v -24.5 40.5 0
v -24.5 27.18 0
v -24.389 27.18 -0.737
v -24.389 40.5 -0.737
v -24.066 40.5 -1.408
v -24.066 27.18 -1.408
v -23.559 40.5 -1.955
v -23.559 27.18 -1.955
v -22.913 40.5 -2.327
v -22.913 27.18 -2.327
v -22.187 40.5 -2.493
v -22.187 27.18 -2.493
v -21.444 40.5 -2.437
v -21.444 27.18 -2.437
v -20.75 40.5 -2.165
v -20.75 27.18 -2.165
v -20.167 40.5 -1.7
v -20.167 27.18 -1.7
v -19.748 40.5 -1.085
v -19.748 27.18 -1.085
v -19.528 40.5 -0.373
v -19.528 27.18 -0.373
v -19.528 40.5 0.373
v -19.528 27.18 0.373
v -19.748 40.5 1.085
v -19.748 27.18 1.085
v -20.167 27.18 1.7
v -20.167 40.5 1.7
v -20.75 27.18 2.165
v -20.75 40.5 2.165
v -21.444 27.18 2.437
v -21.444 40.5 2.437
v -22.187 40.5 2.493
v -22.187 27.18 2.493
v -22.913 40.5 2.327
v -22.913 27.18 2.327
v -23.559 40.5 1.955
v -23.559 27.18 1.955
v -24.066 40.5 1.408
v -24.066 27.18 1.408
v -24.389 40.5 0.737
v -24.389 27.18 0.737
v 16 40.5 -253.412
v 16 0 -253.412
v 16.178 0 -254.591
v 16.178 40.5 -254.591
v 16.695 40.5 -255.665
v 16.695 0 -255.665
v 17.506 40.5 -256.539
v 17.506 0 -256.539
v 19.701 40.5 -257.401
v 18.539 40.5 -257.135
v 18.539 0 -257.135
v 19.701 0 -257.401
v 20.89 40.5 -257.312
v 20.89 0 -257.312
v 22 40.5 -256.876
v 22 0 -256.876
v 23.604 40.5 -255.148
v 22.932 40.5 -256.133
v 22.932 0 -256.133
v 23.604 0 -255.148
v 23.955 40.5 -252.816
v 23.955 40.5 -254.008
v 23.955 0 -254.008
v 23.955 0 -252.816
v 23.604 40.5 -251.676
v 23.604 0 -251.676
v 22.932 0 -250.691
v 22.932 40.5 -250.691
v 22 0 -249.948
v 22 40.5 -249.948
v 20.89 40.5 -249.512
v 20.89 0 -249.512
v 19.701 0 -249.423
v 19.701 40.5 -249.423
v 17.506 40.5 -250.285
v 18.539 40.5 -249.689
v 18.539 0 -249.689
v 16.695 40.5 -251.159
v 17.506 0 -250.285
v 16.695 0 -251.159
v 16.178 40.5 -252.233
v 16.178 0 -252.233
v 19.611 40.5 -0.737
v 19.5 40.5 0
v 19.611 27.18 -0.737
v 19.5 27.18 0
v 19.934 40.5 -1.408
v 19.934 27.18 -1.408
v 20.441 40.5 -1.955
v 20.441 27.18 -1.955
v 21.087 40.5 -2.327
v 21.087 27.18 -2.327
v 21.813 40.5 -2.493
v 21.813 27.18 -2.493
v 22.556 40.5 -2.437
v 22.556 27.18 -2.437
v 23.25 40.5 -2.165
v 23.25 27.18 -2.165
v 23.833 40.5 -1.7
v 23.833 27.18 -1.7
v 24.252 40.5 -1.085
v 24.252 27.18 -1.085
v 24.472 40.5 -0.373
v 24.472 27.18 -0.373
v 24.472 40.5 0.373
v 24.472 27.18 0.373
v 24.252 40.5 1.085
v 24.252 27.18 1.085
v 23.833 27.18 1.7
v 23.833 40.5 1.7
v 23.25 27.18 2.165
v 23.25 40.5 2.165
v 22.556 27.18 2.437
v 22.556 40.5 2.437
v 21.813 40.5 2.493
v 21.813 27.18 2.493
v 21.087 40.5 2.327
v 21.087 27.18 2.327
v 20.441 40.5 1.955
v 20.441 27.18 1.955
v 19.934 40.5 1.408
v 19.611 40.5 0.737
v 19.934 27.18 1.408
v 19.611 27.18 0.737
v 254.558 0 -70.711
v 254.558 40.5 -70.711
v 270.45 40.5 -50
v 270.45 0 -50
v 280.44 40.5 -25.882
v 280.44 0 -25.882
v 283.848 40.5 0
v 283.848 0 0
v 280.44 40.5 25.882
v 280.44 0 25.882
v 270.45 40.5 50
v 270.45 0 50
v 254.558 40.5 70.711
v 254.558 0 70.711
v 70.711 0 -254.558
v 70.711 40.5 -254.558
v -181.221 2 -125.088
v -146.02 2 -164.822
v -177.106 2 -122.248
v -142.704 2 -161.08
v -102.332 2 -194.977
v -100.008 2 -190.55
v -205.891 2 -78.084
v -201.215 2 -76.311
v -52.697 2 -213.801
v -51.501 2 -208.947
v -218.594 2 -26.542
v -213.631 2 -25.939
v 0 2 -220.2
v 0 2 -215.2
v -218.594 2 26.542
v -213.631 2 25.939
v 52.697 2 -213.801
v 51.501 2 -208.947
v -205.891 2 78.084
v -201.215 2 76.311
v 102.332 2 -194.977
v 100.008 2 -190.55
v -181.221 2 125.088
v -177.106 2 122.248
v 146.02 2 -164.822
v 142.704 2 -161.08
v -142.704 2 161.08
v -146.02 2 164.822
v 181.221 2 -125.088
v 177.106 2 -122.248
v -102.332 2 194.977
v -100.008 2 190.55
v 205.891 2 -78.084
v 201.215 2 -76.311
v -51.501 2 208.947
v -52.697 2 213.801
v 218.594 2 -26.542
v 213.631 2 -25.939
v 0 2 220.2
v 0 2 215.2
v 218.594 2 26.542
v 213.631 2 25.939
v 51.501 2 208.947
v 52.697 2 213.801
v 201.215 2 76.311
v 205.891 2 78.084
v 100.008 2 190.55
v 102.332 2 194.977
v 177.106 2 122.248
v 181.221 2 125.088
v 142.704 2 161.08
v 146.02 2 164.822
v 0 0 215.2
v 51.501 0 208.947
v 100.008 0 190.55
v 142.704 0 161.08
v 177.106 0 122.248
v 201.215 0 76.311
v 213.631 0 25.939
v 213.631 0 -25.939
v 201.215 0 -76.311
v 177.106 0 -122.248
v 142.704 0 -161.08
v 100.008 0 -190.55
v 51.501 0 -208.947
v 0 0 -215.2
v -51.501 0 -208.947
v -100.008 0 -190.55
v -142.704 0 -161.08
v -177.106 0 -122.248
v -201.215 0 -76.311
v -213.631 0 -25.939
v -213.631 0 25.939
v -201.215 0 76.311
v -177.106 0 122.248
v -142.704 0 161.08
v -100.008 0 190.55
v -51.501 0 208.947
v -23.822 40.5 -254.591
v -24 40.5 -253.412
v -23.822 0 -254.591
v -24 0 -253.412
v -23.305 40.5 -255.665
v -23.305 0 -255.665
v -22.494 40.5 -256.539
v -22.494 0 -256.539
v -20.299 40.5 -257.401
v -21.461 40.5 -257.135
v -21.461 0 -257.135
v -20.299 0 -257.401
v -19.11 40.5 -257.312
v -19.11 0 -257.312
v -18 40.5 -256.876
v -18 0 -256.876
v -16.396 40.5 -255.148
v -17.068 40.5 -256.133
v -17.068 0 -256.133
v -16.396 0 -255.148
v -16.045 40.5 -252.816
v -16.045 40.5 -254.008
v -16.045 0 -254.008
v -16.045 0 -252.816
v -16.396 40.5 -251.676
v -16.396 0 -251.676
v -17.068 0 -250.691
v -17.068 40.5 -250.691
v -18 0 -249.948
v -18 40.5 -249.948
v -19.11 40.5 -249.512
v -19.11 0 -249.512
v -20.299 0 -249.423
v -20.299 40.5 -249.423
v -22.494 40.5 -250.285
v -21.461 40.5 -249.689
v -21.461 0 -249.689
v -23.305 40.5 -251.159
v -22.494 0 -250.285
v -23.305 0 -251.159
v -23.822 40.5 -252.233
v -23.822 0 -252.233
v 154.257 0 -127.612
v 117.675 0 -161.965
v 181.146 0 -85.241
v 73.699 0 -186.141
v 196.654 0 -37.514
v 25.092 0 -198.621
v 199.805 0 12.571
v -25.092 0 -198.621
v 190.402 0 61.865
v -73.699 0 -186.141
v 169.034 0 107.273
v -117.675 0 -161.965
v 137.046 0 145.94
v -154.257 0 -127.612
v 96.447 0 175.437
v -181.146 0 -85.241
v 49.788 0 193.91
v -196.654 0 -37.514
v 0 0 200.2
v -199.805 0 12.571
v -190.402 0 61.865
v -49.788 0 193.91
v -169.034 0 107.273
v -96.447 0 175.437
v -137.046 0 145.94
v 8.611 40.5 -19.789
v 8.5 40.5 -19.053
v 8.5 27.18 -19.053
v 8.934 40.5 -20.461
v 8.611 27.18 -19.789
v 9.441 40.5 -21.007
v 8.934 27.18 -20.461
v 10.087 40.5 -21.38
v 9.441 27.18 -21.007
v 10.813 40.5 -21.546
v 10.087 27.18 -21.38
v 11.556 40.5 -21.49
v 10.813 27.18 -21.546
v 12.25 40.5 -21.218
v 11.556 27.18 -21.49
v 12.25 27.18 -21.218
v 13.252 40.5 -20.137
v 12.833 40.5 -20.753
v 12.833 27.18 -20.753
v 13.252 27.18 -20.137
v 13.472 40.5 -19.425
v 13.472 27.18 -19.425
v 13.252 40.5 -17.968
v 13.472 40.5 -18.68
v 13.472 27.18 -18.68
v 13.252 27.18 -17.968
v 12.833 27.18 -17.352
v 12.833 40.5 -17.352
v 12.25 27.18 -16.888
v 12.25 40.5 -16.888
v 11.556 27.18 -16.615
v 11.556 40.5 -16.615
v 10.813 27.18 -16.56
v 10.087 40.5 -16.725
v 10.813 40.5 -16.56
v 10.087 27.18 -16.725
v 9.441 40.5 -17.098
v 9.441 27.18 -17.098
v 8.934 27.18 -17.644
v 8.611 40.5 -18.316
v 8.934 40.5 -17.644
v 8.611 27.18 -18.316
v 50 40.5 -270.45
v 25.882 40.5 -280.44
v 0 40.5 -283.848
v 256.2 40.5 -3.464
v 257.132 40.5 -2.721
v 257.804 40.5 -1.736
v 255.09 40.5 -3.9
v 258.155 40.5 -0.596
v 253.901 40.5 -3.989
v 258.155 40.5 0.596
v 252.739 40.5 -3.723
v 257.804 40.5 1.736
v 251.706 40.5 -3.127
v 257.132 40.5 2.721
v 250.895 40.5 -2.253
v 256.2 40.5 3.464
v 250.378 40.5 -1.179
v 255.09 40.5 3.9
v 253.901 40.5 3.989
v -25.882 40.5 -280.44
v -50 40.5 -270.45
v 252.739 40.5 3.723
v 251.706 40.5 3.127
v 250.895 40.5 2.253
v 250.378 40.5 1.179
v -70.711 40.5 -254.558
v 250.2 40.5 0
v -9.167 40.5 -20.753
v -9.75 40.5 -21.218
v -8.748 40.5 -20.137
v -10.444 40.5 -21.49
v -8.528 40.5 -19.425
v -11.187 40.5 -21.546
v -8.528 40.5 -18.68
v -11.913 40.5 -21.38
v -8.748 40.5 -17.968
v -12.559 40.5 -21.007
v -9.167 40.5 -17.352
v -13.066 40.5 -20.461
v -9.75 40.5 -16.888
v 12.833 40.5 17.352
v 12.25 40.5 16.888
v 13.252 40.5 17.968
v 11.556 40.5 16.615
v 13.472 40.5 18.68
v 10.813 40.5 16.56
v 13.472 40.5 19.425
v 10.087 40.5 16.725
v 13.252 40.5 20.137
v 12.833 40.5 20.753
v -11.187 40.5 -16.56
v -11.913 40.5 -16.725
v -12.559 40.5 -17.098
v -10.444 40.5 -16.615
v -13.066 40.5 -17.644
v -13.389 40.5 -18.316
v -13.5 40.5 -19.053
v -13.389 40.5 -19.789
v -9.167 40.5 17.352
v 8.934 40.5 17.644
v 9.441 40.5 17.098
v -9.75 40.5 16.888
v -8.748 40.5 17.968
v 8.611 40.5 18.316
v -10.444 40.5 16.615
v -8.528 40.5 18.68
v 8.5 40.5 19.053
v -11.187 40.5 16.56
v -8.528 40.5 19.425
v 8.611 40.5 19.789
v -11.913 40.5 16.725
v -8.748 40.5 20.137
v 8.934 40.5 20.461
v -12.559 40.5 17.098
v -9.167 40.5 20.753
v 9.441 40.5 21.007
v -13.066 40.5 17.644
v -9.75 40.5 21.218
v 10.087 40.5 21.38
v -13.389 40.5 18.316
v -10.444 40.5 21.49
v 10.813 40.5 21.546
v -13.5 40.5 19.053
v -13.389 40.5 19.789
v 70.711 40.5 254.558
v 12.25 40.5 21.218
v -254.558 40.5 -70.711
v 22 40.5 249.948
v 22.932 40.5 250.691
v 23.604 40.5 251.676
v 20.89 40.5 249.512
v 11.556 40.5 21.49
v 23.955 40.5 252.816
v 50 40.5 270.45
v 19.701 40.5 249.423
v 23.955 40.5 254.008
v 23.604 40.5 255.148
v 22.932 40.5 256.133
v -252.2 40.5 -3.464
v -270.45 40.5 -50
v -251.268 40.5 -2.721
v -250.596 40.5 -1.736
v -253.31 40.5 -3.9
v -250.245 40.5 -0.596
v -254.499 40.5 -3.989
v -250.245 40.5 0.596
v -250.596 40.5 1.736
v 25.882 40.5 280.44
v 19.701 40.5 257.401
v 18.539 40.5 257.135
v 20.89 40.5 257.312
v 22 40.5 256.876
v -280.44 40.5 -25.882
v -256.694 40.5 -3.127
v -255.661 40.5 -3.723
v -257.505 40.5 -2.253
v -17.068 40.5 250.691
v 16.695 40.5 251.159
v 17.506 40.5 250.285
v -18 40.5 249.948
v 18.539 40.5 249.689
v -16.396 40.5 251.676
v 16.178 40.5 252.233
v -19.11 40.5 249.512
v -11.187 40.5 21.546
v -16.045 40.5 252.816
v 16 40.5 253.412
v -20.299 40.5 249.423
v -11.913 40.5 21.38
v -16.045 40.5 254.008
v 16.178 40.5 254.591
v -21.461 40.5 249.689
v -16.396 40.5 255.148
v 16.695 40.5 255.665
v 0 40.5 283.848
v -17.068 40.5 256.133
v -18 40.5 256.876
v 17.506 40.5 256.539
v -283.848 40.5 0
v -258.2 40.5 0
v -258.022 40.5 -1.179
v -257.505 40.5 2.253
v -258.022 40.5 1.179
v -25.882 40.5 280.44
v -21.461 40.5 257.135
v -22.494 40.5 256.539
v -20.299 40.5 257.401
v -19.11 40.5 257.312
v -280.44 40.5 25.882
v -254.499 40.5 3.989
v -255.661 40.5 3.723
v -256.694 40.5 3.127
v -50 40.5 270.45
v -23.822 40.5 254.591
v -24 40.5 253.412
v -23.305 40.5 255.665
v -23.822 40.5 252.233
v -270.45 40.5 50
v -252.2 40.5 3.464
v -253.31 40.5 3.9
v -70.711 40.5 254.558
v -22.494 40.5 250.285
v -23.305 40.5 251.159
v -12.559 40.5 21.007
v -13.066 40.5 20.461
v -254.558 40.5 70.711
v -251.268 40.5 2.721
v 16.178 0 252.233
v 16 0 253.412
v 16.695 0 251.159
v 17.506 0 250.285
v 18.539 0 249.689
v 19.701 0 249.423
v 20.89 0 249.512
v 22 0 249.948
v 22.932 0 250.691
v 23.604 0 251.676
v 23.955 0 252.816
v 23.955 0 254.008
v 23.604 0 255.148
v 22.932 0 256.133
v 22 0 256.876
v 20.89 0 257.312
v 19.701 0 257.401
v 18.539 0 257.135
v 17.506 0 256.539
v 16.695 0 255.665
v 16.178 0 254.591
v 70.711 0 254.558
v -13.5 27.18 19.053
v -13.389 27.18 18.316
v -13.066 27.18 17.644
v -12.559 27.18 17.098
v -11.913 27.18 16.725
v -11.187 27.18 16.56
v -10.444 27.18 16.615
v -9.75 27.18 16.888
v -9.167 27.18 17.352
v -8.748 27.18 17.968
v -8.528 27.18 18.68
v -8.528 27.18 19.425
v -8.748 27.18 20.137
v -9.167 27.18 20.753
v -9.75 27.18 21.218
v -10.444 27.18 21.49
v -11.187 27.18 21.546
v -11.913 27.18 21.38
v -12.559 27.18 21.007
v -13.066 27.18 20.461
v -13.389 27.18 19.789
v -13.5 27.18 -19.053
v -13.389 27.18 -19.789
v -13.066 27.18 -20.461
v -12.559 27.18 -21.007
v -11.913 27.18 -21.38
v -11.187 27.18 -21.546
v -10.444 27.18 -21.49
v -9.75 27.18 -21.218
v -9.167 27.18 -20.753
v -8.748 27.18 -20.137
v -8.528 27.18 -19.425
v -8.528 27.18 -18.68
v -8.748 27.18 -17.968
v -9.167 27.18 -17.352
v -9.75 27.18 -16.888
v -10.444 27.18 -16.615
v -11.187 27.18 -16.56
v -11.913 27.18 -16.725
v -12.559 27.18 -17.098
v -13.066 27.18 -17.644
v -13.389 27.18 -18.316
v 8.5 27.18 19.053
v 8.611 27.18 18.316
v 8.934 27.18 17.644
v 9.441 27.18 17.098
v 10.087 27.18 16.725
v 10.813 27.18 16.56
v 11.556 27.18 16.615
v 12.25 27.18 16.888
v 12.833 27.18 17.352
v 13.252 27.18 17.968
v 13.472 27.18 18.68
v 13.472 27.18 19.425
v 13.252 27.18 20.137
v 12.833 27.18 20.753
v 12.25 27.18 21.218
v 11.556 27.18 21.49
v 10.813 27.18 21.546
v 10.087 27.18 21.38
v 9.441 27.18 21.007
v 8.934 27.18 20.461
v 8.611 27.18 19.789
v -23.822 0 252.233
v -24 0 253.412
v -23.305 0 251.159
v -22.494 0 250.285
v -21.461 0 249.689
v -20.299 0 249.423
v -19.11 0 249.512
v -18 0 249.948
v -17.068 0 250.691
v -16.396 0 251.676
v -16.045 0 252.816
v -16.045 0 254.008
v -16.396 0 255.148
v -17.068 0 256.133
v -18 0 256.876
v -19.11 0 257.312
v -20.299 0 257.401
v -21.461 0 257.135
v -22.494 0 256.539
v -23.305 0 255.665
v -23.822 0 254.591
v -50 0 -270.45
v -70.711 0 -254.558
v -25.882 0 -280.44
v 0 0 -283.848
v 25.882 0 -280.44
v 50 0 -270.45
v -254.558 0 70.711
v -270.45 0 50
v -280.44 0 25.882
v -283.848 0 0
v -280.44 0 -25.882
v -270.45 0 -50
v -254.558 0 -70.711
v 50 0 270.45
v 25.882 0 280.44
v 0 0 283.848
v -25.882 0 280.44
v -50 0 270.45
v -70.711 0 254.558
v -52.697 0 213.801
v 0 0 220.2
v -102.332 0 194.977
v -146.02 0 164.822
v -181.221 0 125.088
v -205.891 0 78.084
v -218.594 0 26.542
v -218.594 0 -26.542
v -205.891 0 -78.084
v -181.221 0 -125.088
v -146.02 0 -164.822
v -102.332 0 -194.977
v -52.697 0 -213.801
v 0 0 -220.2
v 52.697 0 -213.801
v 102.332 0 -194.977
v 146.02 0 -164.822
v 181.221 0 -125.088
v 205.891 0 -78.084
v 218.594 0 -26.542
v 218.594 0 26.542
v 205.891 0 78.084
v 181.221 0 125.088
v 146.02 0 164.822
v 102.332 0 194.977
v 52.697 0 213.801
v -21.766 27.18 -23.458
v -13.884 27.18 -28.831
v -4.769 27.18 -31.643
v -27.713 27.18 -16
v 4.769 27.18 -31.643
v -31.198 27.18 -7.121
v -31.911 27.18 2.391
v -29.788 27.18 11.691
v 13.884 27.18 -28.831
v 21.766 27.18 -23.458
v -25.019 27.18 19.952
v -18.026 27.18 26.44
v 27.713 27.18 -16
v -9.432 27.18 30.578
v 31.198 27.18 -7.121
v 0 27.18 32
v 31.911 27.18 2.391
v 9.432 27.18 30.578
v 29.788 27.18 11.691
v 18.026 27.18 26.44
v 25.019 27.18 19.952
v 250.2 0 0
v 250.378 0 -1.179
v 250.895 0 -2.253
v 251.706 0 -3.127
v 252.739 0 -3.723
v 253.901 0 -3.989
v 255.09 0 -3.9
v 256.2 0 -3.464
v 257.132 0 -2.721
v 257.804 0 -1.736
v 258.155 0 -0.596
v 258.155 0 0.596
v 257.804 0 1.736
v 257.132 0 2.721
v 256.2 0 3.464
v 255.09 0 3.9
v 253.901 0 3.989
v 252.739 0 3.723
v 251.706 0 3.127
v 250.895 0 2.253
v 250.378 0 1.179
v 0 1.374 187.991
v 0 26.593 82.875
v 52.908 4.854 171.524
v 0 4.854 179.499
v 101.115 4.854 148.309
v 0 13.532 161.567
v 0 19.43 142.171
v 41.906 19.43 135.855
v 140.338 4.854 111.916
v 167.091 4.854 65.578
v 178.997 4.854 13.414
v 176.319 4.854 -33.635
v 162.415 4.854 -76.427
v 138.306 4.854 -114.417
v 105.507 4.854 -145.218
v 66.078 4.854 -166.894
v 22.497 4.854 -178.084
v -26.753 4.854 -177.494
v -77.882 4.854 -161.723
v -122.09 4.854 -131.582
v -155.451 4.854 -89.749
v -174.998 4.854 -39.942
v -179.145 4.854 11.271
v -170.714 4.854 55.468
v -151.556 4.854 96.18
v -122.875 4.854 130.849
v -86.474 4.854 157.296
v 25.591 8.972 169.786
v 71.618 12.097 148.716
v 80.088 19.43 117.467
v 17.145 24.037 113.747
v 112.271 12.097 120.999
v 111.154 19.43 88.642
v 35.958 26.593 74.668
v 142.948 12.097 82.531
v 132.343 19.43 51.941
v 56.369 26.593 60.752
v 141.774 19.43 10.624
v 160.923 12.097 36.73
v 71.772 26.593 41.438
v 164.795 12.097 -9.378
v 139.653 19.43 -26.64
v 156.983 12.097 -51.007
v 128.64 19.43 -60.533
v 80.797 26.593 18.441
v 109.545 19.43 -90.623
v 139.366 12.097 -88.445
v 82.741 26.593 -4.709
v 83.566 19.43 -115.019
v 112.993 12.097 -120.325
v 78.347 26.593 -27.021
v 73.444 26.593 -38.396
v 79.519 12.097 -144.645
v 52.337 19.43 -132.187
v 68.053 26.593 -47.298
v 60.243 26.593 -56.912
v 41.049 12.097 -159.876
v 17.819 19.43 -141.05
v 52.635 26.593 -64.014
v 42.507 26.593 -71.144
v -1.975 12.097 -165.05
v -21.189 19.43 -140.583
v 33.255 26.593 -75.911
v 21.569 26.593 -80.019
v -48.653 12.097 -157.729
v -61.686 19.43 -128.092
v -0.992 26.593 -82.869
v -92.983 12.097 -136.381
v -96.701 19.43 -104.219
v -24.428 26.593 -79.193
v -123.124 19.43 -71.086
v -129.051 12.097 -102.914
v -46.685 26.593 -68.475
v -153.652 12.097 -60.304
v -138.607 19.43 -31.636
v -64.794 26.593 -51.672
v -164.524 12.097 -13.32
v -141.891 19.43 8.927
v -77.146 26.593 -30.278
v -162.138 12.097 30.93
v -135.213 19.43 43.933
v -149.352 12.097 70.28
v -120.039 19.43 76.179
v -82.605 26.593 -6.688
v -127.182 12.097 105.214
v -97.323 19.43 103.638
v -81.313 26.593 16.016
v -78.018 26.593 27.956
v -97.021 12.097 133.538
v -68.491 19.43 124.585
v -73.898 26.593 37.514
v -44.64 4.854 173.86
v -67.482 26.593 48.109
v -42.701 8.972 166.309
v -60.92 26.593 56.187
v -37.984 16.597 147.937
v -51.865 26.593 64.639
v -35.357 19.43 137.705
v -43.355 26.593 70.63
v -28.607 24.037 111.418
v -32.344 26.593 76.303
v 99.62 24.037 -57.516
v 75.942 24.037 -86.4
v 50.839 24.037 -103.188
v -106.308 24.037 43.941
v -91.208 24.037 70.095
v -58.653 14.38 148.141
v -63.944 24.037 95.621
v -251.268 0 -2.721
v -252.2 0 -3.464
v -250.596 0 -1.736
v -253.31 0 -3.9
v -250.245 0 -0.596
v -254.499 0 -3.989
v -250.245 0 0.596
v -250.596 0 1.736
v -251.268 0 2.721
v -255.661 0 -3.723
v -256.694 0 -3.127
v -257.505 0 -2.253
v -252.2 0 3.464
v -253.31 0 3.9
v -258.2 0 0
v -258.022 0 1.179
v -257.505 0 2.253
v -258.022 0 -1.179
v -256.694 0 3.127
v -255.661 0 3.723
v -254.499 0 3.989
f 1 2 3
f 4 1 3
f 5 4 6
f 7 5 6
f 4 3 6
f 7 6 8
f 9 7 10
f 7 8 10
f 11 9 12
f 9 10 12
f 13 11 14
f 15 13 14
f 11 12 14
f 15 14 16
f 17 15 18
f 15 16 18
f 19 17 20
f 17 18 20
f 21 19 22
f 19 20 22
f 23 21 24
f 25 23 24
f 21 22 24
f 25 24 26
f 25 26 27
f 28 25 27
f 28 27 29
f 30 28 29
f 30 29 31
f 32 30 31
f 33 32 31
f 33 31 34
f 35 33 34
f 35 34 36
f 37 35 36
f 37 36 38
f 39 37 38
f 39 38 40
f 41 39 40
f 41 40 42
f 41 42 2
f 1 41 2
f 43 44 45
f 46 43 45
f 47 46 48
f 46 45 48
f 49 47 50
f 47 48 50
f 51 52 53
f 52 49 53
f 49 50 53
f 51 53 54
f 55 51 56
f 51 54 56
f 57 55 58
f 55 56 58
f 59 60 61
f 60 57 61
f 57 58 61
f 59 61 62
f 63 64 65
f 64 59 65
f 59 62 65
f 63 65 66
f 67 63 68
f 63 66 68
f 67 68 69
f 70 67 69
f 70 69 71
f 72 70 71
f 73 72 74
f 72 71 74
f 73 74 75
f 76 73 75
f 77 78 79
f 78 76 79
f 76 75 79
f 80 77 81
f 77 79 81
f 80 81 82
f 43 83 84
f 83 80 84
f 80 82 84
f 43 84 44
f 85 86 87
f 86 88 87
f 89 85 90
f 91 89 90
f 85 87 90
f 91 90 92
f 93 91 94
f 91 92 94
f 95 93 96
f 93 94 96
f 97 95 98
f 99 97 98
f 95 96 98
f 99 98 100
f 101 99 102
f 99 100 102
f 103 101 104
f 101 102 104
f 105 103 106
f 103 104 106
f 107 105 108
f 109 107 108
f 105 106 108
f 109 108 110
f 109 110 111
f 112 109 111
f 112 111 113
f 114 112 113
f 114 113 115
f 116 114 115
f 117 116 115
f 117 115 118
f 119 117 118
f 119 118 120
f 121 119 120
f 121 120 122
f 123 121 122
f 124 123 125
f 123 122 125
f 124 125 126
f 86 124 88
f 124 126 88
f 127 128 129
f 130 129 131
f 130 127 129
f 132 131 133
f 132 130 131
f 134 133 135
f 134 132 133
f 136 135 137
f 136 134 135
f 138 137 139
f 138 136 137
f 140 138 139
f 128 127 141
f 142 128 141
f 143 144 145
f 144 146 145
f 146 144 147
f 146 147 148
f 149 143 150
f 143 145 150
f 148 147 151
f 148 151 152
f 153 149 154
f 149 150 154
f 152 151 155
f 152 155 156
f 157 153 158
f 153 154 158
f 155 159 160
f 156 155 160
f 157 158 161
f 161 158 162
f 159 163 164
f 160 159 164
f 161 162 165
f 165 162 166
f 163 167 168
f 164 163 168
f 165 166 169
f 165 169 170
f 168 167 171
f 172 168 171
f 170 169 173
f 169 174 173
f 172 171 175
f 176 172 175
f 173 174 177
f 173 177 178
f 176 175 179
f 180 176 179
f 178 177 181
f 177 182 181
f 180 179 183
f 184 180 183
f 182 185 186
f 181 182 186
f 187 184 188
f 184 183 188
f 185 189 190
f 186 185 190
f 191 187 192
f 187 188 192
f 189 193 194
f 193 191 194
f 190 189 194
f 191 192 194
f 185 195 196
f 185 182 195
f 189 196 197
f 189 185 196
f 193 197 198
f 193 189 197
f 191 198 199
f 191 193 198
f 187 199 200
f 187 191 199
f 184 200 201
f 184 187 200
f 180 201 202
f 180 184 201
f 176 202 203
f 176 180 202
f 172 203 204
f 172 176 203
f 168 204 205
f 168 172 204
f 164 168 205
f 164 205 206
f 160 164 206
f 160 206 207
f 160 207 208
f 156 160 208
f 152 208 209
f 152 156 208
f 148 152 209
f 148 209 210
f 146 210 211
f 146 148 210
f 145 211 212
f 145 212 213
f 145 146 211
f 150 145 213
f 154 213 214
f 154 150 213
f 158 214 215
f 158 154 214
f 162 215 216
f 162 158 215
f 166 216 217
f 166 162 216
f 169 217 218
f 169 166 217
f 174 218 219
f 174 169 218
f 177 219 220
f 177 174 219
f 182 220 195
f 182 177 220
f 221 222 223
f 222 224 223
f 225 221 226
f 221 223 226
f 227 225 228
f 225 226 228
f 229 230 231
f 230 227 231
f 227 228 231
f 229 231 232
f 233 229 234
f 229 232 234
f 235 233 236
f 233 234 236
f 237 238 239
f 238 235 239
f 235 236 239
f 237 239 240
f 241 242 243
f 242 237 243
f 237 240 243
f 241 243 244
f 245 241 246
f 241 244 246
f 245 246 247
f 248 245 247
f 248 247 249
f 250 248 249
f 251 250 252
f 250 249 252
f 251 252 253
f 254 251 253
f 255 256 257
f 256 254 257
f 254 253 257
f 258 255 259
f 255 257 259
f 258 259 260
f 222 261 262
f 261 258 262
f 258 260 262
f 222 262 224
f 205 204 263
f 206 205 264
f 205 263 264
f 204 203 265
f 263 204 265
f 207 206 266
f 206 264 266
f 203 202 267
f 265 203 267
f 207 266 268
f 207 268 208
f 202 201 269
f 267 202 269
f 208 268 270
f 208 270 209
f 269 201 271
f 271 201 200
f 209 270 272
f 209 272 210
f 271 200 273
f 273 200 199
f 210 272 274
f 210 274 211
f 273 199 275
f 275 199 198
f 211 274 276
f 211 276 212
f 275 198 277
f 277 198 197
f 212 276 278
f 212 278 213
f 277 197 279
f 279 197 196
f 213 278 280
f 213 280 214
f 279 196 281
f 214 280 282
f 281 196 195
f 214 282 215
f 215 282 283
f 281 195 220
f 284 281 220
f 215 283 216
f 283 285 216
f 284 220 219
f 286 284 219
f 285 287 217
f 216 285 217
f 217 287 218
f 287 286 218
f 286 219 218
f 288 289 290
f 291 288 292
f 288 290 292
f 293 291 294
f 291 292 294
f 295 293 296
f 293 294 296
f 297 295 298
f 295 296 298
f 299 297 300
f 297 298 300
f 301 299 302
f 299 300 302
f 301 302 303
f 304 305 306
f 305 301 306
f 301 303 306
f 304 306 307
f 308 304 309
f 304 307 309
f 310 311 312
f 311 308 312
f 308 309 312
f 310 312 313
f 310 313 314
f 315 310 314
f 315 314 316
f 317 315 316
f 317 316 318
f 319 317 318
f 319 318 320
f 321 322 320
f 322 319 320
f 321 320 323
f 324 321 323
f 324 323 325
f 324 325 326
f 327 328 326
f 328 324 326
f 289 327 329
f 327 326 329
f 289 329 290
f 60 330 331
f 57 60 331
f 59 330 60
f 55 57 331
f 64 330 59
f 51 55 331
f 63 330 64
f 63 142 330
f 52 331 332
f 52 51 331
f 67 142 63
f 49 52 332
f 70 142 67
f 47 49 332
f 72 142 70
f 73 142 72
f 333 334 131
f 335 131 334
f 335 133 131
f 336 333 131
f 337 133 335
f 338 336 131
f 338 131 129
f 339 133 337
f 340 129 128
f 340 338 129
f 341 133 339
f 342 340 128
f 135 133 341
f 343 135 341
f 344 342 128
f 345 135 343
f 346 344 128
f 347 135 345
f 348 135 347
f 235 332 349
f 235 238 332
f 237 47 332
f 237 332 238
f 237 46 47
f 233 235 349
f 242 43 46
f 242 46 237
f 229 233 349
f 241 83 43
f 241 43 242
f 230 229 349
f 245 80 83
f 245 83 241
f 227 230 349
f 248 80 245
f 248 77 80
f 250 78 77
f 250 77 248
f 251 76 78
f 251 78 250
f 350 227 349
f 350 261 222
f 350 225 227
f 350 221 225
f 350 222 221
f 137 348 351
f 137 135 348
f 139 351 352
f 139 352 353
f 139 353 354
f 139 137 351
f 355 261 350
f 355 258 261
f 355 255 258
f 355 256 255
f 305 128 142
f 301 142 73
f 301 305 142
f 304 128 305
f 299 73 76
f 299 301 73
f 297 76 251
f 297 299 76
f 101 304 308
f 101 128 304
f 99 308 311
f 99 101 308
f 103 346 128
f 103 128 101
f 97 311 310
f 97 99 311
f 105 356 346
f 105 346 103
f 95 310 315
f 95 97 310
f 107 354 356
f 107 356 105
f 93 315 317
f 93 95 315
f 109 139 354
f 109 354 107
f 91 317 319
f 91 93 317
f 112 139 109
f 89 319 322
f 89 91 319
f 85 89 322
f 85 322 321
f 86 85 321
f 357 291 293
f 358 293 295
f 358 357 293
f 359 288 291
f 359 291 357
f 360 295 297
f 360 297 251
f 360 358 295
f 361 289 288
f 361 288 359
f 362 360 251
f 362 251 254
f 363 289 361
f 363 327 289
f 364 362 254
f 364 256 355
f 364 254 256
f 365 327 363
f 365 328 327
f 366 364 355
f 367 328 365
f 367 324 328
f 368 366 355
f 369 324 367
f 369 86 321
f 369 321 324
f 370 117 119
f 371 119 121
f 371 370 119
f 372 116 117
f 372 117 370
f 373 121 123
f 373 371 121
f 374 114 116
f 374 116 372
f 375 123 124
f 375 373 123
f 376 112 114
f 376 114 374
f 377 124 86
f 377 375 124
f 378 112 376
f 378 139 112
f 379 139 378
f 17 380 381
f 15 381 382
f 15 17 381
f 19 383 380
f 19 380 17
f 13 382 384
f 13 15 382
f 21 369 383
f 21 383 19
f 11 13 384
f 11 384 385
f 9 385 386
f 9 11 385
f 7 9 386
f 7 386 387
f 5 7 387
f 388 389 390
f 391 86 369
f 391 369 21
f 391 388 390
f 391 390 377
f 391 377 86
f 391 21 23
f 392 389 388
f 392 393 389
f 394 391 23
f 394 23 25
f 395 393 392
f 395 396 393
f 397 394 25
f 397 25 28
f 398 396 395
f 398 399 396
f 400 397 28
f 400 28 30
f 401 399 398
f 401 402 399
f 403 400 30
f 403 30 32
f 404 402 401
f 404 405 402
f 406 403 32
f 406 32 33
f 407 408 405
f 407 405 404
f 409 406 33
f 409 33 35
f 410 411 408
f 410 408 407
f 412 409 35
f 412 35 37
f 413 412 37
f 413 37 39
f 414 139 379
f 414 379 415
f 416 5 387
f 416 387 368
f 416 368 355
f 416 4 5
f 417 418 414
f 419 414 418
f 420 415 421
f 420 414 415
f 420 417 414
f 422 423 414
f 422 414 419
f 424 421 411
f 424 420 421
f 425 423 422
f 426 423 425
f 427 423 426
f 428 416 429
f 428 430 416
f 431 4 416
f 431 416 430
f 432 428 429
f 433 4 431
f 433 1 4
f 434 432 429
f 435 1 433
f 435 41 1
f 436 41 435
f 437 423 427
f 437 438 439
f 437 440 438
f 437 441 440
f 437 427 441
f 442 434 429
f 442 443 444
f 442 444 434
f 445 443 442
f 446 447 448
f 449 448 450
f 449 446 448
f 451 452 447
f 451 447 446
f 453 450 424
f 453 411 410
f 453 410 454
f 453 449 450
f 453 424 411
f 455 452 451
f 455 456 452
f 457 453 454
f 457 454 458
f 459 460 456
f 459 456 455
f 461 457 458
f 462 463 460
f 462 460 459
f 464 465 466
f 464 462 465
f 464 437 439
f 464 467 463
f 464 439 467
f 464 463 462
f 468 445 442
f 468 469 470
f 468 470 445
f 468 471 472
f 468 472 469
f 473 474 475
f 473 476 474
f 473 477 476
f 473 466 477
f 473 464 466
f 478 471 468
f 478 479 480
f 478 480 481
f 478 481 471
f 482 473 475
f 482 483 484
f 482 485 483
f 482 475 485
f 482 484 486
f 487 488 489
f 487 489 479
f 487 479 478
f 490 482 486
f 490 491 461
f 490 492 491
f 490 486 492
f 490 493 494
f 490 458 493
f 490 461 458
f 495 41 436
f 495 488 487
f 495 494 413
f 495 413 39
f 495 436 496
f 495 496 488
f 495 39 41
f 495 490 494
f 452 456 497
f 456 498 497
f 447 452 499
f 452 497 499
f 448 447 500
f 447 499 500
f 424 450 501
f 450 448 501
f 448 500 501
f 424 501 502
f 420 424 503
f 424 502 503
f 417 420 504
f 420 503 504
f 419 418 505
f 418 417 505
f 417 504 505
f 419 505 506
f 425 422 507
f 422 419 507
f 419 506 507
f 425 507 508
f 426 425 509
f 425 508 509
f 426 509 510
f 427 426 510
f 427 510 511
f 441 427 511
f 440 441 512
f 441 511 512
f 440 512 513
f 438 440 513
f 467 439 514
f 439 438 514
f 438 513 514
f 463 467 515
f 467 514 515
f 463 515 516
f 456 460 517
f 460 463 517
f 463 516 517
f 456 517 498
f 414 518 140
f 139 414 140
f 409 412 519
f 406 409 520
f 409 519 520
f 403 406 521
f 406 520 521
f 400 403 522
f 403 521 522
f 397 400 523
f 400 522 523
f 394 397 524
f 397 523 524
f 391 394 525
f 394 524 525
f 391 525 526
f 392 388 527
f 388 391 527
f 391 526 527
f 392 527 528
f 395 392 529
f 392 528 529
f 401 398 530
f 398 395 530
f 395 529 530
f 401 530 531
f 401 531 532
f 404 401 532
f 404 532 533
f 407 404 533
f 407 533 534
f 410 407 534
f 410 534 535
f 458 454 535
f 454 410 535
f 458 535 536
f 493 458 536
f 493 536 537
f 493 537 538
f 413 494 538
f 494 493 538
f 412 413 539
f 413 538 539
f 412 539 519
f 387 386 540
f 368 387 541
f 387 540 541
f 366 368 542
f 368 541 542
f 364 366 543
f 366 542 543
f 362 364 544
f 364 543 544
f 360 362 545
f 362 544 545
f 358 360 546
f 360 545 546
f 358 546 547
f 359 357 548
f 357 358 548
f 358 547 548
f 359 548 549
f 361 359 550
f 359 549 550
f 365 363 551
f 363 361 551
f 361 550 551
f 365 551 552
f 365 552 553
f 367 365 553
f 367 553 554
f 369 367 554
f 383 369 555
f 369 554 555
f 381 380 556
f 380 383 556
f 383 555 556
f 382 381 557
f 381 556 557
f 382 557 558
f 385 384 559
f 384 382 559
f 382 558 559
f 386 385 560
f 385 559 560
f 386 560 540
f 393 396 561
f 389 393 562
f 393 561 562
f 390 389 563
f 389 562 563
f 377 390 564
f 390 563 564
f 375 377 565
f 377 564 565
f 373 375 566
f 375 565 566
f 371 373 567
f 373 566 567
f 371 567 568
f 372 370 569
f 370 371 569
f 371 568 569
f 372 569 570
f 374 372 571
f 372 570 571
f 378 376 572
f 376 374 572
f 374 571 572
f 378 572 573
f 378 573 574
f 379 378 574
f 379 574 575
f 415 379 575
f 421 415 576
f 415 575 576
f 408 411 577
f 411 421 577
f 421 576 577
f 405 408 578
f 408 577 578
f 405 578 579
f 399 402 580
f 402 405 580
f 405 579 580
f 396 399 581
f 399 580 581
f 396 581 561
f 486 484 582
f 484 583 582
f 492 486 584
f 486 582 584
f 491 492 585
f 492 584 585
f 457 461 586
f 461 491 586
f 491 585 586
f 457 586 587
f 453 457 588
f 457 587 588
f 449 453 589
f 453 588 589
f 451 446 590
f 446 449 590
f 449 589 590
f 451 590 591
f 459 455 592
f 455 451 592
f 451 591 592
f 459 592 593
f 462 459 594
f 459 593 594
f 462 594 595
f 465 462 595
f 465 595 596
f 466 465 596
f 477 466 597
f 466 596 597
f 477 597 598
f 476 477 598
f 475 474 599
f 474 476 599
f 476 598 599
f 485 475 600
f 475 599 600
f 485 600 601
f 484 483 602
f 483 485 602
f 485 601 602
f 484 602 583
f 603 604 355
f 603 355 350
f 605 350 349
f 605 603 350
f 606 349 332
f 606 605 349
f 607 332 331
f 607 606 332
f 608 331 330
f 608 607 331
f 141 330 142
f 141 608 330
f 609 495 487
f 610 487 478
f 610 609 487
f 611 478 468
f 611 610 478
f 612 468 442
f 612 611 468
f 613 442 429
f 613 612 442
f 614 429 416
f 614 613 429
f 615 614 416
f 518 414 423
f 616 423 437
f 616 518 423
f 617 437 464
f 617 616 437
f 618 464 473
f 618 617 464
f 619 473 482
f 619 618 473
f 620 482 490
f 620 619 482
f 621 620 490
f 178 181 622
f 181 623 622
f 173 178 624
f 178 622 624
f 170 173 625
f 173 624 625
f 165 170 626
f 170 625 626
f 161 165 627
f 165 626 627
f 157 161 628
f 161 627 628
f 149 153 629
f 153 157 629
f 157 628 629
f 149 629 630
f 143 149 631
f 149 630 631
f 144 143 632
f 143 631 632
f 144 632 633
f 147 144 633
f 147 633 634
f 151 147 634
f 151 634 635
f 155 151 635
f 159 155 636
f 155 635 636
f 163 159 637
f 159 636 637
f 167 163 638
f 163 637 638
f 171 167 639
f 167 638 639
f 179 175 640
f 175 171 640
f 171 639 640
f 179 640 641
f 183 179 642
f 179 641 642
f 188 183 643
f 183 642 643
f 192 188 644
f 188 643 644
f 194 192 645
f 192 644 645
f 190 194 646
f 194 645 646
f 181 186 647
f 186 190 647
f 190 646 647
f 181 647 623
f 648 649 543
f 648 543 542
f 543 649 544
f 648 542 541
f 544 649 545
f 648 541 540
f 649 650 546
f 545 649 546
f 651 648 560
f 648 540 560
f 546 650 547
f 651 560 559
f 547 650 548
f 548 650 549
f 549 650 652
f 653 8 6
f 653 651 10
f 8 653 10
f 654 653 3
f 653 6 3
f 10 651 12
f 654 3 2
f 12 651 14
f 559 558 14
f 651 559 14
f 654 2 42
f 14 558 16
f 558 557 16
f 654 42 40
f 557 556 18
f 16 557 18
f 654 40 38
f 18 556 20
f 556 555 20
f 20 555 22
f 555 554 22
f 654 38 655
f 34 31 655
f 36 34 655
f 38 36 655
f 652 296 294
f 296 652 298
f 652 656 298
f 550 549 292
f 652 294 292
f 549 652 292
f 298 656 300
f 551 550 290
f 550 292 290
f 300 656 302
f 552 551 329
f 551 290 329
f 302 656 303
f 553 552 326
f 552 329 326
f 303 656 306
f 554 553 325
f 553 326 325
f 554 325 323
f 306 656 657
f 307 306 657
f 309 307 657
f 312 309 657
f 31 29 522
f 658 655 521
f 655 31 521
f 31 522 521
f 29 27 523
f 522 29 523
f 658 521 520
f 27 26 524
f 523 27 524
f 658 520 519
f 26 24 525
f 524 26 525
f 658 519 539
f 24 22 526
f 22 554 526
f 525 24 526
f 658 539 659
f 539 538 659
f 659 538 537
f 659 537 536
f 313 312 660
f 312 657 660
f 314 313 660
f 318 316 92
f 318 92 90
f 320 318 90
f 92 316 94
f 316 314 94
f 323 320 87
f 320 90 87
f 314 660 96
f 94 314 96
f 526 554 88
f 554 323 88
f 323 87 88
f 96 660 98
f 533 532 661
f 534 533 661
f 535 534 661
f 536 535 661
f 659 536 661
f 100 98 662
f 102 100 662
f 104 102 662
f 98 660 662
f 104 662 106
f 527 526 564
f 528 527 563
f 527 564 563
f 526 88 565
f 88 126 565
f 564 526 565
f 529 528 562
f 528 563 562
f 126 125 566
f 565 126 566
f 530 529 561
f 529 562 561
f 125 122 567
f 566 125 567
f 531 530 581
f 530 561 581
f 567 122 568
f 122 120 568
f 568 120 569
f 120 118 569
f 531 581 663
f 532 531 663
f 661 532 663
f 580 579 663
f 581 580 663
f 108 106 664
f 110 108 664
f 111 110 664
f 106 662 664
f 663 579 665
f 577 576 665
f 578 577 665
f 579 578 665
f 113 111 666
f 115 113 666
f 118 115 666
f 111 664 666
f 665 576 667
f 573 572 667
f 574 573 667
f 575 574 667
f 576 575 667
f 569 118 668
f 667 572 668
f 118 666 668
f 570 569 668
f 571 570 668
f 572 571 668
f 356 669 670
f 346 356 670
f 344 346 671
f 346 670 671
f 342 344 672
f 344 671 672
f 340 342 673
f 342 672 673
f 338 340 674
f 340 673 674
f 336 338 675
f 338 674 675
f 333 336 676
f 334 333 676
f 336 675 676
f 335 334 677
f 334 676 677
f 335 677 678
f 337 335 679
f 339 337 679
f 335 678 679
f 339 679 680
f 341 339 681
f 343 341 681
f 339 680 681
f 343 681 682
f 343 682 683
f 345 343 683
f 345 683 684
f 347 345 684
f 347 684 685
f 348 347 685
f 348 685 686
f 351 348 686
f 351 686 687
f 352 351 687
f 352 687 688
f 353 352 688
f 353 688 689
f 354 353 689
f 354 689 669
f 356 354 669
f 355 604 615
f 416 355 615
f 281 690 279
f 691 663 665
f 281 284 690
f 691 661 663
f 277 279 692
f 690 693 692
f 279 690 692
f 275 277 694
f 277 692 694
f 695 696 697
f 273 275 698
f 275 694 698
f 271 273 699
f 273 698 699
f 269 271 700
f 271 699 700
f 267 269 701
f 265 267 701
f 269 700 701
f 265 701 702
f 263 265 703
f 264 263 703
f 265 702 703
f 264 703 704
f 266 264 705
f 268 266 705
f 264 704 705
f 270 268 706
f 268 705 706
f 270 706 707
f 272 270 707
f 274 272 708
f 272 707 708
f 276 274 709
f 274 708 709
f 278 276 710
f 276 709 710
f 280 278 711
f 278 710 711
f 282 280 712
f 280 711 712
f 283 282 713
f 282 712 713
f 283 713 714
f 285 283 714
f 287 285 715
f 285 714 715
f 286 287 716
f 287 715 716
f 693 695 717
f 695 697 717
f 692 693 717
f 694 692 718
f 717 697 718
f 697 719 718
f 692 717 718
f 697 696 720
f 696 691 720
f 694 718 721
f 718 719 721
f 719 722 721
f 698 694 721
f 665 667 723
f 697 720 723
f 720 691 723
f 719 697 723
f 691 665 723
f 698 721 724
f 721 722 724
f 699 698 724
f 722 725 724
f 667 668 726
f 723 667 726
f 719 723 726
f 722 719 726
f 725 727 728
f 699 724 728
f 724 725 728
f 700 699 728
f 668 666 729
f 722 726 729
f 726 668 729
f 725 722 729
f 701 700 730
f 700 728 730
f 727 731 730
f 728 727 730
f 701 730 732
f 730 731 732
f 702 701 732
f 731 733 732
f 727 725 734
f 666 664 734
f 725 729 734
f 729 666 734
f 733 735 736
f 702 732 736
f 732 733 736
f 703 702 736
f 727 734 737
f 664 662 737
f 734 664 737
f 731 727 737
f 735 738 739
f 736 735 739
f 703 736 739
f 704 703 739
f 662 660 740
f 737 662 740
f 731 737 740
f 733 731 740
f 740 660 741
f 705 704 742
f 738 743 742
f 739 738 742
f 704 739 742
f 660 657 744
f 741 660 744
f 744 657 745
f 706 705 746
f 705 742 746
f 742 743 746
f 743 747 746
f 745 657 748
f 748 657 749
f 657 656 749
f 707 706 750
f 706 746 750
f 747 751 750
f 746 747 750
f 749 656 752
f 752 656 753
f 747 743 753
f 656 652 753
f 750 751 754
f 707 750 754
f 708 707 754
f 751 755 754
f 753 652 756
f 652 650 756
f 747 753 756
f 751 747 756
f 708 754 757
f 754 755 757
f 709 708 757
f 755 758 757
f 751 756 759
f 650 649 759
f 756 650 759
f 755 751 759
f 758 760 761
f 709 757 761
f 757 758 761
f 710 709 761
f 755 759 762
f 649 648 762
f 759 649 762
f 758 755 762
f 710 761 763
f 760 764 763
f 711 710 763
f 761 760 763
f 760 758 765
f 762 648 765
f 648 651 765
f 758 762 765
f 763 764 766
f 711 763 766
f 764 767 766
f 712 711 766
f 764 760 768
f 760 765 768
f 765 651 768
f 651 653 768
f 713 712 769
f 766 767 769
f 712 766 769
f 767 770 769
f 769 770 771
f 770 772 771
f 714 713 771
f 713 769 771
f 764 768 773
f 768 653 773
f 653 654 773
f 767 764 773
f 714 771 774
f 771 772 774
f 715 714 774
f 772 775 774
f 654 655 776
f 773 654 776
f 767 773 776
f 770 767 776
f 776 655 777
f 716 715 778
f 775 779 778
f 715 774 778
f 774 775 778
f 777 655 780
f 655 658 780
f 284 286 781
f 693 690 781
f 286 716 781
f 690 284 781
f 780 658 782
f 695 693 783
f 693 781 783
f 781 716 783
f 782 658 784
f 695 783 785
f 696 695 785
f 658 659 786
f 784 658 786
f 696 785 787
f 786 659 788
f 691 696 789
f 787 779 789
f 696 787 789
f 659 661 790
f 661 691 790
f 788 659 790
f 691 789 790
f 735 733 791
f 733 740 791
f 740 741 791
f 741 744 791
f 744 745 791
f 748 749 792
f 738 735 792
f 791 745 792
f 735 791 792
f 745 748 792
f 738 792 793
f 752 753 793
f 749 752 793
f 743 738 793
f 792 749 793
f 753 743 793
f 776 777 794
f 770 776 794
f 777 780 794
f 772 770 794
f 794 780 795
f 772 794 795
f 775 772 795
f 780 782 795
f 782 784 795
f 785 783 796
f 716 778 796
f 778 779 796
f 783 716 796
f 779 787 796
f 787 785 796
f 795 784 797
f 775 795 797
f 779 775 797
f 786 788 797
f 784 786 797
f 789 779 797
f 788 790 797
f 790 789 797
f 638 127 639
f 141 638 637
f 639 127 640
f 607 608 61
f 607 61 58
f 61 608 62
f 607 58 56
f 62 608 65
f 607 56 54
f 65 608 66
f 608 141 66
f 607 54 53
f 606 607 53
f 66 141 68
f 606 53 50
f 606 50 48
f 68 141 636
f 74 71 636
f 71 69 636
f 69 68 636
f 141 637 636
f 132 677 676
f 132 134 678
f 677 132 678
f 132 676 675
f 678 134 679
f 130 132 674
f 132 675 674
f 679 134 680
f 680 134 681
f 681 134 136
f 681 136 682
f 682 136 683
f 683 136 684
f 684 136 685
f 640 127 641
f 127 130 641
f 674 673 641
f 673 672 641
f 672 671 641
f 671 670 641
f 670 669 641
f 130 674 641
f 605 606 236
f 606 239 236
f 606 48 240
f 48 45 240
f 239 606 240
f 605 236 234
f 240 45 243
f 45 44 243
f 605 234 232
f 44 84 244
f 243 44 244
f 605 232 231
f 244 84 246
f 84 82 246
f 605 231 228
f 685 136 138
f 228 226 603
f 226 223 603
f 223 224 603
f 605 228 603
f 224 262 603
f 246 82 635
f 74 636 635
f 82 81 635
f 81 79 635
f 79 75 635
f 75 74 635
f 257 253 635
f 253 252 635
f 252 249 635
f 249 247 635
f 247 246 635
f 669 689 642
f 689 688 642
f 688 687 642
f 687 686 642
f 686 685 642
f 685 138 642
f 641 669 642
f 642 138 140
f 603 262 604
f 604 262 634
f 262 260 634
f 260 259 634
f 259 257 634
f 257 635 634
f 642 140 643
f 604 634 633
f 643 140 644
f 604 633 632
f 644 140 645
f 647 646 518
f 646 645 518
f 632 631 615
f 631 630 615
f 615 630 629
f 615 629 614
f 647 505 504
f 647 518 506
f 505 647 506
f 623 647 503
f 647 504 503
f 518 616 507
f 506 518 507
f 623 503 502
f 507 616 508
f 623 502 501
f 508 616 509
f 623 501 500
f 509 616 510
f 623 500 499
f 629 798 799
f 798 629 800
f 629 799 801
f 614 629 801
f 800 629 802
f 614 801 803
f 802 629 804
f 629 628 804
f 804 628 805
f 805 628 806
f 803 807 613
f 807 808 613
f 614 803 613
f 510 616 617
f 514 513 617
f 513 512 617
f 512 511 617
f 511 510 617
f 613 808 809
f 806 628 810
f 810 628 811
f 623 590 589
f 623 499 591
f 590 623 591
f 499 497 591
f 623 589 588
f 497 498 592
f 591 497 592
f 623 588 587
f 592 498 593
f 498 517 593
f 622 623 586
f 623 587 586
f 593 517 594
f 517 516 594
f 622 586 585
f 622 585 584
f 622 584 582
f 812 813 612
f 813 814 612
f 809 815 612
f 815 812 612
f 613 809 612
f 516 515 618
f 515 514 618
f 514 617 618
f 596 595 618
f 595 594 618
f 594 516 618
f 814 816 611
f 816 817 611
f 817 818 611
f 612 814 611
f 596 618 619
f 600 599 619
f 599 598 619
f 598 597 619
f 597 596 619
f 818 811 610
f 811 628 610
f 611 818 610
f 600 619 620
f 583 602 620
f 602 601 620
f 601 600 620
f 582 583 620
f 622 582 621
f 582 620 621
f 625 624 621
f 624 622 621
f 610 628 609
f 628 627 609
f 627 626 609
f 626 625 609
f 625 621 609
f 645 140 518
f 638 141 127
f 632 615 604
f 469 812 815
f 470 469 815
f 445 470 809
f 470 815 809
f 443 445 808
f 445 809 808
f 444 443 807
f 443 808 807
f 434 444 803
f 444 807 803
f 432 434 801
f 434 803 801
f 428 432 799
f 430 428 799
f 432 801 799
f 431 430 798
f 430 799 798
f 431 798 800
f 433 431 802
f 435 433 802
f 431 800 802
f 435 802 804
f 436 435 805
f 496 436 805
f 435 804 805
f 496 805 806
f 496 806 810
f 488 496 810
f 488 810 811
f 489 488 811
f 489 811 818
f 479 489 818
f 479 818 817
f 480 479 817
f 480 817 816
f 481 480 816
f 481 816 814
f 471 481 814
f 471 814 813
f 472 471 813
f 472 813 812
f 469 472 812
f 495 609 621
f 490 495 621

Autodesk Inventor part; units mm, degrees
ref_plane "YZ Plane" through (0, 0, 0) normal (1, 0, 0) x (0, 1, 0)
ref_plane "XZ Plane" through (0, 0, 0) normal (0, 1, 0) x (-1, 0, 0)
sketch "Esquisse1" plane through (0, 0, 0) normal (0, 1, 0) x (-1, 0, 0)
  circle A0 centre (0, 0) radius 215.2 construction
  line L0 (0, -455.3768) -> (0, 455.3768) projected
  line L1 (-455.3768, 0) -> (455.3768, 0) projected
  line L2 (70.7107, -254.5584) -> (254.5584, -70.7107)
  line L3 (254.5584, 70.7107) -> (70.7107, 254.5584)
  line L4 (-70.7107, 254.5584) -> (-254.5584, 70.7107)
  line L5 (-254.5584, -70.7107) -> (-70.7107, -254.5584)
  line L6 (0, -325.2691) -> (0, 325.2691) construction
  line L7 (325.2691, 0) -> (-325.2691, 0) construction
  circle A1 centre (-20, 253.412) radius 4
  circle A2 centre (11, -19.0526) radius 2.5 projected
  circle A3 centre (-11, -19.0526) radius 2.5 projected
  circle A4 centre (-22, 0) radius 2.5 projected
  circle A5 centre (-11, 19.0526) radius 2.5 projected
  circle A6 centre (11, 19.0526) radius 2.5 projected
  circle A7 centre (22, 0) radius 2.5 projected
  circle A8 centre (0, 0) radius 30 construction
  circle A9 centre (0, 0) radius 13 construction
  arc A10 (-254.5584, 70.7107) -> (-254.5584, -70.7107) centre (-183.8478, 0) ccw
  arc A11 (70.7107, 254.5584) -> (-70.7107, 254.5584) centre (0, 183.8478) ccw
  arc A12 (-70.7107, -254.5584) -> (70.7107, -254.5584) centre (0, -183.8478) ccw
  arc A13 (254.5584, -70.7107) -> (254.5584, 70.7107) centre (183.8478, 0) ccw
  circle A14 centre (20, 253.412) radius 4
  circle A15 centre (-20, -253.412) radius 4
  circle A16 centre (20, -253.412) radius 4
  circle A17 centre (-254.2, 0) radius 4
  circle A18 centre (254.2, 0) radius 4
  point P0 (0, 0)
  dimension "d1" = 460
  dimension "d2" = 8
  dimension "d3" = 35
  dimension "d13" = 100
  dimension "d14" = 20
  dimension "d15" = 35
ref_plane "Plan de construction1" through (-34.1506, 32.18, -34.1506) normal (0, 1, 0) x (0.5, 0, 0.8660254)
extrude "Extrusion1" add sketch "Esquisse1" along normal blind 40.5 contours A12 L5 A10 L1 A17 A4 L0 | L0 L1 A7 A18 A13 L2 A12 | L1 A4 A17 A10 L4 A11 L0 | L0 A11 L3 A13 L1 A18 A7
sketch "Esquisse2" plane through (0, 0, 0) normal (1, 0, 0) x (0, 1, 0)
  line L0 (0, 215.2) -> (0, -215.2) projected
  spline S0 degree 3 poles (0, 200.2) (0, 199.1288) (0.0427, 197.117) (0.1932, 194.8886) (0.4094, 192.844) (0.6322, 191.3431) (0.9669, 189.6041) (1.2775, 188.3098) (1.7156, 186.7818) (2.1051, 185.619) (2.6389, 184.2112) (3.1032, 183.1108) (3.7289, 181.7436) (4.2649, 180.6479) (4.9765, 179.2567) (5.5773, 178.1196) (6.363, 176.6528) (7.017, 175.4374) (7.8605, 173.8529) (8.5535, 172.5284) (9.4365, 170.7907) (10.1537, 169.3309) (11.0581, 167.4098) (11.7859, 165.7925) (12.6956, 163.6626) (13.4217, 161.8692) (14.3225, 159.5092) (15.0362, 157.5244) (15.9156, 154.9177) (16.6075, 152.7301) (17.4542, 149.8647) (18.1158, 147.4666) (18.9197, 144.3355) (19.5431, 141.7234) (20.2945, 138.3249) (20.8724, 135.5001) (21.5631, 131.8402) (22.0894, 128.811) (22.7129, 124.904) (23.1834, 121.6852) (23.7349, 117.5541) (24.1466, 114.1673) (24.6235, 109.8437) (24.9748, 106.3179) (25.3761, 101.842) (25.667, 98.213) (25.9934, 93.6343) (26.2251, 89.945) (26.4792, 85.3215) (26.6546, 81.6221) (26.8408, 77.0209) (26.9641, 73.3685) (27.0885, 68.8656) (27.1653, 65.3246) (27.236, 61.005) (27.2735, 57.6471) (27.3002, 53.6047) (27.307, 50.5086) (27.3014, 46.8466) (27.2875, 44.0985) (27.2632, 40.9295) (27.2402, 38.6236) (27.2152, 36.3262) (27.2005, 34.9709) (27.1891, 33.7716) (27.1821, 32.8731) (27.18, 32.27) (27.18, 32) knots 1 1 1 1 1.041667 1.083333 1.104167 1.145833 1.166667 1.208333 1.229167 1.270833 1.291667 1.333333 1.354167 1.395833 1.416667 1.458333 1.479167 1.520833 1.541667 1.583333 1.604167 1.645833 1.666667 1.708333 1.729167 1.770833 1.791667 1.833333 1.854167 1.895833 1.916667 1.958333 1.979167 2.020833 2.041667 2.083333 2.104167 2.145833 2.166667 2.208333 2.229167 2.270833 2.291667 2.333333 2.354167 2.395833 2.416667 2.458333 2.479167 2.520833 2.541667 2.583333 2.604167 2.645833 2.666667 2.708333 2.729167 2.770833 2.791667 2.833333 2.854167 2.895833 2.916667 2.947917 2.958333 2.979167 3 3 3 3 projected
  line L1 (27.18, 32) -> (27.18, -32) projected
  line L2 (27.18, 0) -> (0, 0)
  line L3 (-10.4655, 0) -> (47.1338, 0) projected
  line L4 (0, 215.2) -> (2, 215.2)
  line L5 (2, 215.2) -> (2, 220.2)
  line L6 (2, 220.2) -> (0, 220.2)
  line L7 (0, 220.2) -> (0, 215.2)
  point P0 (0, 200.1682)
  dimension "d11" = 5
  dimension "d12" = 2
revolve "Révolution1" cut sketch "Esquisse2" angle 360 about axis through (0, -10, 0) along (0, 1, 0)
equation "\"d15\" = d3"
properties part number "wheel_rim_mold_A"
